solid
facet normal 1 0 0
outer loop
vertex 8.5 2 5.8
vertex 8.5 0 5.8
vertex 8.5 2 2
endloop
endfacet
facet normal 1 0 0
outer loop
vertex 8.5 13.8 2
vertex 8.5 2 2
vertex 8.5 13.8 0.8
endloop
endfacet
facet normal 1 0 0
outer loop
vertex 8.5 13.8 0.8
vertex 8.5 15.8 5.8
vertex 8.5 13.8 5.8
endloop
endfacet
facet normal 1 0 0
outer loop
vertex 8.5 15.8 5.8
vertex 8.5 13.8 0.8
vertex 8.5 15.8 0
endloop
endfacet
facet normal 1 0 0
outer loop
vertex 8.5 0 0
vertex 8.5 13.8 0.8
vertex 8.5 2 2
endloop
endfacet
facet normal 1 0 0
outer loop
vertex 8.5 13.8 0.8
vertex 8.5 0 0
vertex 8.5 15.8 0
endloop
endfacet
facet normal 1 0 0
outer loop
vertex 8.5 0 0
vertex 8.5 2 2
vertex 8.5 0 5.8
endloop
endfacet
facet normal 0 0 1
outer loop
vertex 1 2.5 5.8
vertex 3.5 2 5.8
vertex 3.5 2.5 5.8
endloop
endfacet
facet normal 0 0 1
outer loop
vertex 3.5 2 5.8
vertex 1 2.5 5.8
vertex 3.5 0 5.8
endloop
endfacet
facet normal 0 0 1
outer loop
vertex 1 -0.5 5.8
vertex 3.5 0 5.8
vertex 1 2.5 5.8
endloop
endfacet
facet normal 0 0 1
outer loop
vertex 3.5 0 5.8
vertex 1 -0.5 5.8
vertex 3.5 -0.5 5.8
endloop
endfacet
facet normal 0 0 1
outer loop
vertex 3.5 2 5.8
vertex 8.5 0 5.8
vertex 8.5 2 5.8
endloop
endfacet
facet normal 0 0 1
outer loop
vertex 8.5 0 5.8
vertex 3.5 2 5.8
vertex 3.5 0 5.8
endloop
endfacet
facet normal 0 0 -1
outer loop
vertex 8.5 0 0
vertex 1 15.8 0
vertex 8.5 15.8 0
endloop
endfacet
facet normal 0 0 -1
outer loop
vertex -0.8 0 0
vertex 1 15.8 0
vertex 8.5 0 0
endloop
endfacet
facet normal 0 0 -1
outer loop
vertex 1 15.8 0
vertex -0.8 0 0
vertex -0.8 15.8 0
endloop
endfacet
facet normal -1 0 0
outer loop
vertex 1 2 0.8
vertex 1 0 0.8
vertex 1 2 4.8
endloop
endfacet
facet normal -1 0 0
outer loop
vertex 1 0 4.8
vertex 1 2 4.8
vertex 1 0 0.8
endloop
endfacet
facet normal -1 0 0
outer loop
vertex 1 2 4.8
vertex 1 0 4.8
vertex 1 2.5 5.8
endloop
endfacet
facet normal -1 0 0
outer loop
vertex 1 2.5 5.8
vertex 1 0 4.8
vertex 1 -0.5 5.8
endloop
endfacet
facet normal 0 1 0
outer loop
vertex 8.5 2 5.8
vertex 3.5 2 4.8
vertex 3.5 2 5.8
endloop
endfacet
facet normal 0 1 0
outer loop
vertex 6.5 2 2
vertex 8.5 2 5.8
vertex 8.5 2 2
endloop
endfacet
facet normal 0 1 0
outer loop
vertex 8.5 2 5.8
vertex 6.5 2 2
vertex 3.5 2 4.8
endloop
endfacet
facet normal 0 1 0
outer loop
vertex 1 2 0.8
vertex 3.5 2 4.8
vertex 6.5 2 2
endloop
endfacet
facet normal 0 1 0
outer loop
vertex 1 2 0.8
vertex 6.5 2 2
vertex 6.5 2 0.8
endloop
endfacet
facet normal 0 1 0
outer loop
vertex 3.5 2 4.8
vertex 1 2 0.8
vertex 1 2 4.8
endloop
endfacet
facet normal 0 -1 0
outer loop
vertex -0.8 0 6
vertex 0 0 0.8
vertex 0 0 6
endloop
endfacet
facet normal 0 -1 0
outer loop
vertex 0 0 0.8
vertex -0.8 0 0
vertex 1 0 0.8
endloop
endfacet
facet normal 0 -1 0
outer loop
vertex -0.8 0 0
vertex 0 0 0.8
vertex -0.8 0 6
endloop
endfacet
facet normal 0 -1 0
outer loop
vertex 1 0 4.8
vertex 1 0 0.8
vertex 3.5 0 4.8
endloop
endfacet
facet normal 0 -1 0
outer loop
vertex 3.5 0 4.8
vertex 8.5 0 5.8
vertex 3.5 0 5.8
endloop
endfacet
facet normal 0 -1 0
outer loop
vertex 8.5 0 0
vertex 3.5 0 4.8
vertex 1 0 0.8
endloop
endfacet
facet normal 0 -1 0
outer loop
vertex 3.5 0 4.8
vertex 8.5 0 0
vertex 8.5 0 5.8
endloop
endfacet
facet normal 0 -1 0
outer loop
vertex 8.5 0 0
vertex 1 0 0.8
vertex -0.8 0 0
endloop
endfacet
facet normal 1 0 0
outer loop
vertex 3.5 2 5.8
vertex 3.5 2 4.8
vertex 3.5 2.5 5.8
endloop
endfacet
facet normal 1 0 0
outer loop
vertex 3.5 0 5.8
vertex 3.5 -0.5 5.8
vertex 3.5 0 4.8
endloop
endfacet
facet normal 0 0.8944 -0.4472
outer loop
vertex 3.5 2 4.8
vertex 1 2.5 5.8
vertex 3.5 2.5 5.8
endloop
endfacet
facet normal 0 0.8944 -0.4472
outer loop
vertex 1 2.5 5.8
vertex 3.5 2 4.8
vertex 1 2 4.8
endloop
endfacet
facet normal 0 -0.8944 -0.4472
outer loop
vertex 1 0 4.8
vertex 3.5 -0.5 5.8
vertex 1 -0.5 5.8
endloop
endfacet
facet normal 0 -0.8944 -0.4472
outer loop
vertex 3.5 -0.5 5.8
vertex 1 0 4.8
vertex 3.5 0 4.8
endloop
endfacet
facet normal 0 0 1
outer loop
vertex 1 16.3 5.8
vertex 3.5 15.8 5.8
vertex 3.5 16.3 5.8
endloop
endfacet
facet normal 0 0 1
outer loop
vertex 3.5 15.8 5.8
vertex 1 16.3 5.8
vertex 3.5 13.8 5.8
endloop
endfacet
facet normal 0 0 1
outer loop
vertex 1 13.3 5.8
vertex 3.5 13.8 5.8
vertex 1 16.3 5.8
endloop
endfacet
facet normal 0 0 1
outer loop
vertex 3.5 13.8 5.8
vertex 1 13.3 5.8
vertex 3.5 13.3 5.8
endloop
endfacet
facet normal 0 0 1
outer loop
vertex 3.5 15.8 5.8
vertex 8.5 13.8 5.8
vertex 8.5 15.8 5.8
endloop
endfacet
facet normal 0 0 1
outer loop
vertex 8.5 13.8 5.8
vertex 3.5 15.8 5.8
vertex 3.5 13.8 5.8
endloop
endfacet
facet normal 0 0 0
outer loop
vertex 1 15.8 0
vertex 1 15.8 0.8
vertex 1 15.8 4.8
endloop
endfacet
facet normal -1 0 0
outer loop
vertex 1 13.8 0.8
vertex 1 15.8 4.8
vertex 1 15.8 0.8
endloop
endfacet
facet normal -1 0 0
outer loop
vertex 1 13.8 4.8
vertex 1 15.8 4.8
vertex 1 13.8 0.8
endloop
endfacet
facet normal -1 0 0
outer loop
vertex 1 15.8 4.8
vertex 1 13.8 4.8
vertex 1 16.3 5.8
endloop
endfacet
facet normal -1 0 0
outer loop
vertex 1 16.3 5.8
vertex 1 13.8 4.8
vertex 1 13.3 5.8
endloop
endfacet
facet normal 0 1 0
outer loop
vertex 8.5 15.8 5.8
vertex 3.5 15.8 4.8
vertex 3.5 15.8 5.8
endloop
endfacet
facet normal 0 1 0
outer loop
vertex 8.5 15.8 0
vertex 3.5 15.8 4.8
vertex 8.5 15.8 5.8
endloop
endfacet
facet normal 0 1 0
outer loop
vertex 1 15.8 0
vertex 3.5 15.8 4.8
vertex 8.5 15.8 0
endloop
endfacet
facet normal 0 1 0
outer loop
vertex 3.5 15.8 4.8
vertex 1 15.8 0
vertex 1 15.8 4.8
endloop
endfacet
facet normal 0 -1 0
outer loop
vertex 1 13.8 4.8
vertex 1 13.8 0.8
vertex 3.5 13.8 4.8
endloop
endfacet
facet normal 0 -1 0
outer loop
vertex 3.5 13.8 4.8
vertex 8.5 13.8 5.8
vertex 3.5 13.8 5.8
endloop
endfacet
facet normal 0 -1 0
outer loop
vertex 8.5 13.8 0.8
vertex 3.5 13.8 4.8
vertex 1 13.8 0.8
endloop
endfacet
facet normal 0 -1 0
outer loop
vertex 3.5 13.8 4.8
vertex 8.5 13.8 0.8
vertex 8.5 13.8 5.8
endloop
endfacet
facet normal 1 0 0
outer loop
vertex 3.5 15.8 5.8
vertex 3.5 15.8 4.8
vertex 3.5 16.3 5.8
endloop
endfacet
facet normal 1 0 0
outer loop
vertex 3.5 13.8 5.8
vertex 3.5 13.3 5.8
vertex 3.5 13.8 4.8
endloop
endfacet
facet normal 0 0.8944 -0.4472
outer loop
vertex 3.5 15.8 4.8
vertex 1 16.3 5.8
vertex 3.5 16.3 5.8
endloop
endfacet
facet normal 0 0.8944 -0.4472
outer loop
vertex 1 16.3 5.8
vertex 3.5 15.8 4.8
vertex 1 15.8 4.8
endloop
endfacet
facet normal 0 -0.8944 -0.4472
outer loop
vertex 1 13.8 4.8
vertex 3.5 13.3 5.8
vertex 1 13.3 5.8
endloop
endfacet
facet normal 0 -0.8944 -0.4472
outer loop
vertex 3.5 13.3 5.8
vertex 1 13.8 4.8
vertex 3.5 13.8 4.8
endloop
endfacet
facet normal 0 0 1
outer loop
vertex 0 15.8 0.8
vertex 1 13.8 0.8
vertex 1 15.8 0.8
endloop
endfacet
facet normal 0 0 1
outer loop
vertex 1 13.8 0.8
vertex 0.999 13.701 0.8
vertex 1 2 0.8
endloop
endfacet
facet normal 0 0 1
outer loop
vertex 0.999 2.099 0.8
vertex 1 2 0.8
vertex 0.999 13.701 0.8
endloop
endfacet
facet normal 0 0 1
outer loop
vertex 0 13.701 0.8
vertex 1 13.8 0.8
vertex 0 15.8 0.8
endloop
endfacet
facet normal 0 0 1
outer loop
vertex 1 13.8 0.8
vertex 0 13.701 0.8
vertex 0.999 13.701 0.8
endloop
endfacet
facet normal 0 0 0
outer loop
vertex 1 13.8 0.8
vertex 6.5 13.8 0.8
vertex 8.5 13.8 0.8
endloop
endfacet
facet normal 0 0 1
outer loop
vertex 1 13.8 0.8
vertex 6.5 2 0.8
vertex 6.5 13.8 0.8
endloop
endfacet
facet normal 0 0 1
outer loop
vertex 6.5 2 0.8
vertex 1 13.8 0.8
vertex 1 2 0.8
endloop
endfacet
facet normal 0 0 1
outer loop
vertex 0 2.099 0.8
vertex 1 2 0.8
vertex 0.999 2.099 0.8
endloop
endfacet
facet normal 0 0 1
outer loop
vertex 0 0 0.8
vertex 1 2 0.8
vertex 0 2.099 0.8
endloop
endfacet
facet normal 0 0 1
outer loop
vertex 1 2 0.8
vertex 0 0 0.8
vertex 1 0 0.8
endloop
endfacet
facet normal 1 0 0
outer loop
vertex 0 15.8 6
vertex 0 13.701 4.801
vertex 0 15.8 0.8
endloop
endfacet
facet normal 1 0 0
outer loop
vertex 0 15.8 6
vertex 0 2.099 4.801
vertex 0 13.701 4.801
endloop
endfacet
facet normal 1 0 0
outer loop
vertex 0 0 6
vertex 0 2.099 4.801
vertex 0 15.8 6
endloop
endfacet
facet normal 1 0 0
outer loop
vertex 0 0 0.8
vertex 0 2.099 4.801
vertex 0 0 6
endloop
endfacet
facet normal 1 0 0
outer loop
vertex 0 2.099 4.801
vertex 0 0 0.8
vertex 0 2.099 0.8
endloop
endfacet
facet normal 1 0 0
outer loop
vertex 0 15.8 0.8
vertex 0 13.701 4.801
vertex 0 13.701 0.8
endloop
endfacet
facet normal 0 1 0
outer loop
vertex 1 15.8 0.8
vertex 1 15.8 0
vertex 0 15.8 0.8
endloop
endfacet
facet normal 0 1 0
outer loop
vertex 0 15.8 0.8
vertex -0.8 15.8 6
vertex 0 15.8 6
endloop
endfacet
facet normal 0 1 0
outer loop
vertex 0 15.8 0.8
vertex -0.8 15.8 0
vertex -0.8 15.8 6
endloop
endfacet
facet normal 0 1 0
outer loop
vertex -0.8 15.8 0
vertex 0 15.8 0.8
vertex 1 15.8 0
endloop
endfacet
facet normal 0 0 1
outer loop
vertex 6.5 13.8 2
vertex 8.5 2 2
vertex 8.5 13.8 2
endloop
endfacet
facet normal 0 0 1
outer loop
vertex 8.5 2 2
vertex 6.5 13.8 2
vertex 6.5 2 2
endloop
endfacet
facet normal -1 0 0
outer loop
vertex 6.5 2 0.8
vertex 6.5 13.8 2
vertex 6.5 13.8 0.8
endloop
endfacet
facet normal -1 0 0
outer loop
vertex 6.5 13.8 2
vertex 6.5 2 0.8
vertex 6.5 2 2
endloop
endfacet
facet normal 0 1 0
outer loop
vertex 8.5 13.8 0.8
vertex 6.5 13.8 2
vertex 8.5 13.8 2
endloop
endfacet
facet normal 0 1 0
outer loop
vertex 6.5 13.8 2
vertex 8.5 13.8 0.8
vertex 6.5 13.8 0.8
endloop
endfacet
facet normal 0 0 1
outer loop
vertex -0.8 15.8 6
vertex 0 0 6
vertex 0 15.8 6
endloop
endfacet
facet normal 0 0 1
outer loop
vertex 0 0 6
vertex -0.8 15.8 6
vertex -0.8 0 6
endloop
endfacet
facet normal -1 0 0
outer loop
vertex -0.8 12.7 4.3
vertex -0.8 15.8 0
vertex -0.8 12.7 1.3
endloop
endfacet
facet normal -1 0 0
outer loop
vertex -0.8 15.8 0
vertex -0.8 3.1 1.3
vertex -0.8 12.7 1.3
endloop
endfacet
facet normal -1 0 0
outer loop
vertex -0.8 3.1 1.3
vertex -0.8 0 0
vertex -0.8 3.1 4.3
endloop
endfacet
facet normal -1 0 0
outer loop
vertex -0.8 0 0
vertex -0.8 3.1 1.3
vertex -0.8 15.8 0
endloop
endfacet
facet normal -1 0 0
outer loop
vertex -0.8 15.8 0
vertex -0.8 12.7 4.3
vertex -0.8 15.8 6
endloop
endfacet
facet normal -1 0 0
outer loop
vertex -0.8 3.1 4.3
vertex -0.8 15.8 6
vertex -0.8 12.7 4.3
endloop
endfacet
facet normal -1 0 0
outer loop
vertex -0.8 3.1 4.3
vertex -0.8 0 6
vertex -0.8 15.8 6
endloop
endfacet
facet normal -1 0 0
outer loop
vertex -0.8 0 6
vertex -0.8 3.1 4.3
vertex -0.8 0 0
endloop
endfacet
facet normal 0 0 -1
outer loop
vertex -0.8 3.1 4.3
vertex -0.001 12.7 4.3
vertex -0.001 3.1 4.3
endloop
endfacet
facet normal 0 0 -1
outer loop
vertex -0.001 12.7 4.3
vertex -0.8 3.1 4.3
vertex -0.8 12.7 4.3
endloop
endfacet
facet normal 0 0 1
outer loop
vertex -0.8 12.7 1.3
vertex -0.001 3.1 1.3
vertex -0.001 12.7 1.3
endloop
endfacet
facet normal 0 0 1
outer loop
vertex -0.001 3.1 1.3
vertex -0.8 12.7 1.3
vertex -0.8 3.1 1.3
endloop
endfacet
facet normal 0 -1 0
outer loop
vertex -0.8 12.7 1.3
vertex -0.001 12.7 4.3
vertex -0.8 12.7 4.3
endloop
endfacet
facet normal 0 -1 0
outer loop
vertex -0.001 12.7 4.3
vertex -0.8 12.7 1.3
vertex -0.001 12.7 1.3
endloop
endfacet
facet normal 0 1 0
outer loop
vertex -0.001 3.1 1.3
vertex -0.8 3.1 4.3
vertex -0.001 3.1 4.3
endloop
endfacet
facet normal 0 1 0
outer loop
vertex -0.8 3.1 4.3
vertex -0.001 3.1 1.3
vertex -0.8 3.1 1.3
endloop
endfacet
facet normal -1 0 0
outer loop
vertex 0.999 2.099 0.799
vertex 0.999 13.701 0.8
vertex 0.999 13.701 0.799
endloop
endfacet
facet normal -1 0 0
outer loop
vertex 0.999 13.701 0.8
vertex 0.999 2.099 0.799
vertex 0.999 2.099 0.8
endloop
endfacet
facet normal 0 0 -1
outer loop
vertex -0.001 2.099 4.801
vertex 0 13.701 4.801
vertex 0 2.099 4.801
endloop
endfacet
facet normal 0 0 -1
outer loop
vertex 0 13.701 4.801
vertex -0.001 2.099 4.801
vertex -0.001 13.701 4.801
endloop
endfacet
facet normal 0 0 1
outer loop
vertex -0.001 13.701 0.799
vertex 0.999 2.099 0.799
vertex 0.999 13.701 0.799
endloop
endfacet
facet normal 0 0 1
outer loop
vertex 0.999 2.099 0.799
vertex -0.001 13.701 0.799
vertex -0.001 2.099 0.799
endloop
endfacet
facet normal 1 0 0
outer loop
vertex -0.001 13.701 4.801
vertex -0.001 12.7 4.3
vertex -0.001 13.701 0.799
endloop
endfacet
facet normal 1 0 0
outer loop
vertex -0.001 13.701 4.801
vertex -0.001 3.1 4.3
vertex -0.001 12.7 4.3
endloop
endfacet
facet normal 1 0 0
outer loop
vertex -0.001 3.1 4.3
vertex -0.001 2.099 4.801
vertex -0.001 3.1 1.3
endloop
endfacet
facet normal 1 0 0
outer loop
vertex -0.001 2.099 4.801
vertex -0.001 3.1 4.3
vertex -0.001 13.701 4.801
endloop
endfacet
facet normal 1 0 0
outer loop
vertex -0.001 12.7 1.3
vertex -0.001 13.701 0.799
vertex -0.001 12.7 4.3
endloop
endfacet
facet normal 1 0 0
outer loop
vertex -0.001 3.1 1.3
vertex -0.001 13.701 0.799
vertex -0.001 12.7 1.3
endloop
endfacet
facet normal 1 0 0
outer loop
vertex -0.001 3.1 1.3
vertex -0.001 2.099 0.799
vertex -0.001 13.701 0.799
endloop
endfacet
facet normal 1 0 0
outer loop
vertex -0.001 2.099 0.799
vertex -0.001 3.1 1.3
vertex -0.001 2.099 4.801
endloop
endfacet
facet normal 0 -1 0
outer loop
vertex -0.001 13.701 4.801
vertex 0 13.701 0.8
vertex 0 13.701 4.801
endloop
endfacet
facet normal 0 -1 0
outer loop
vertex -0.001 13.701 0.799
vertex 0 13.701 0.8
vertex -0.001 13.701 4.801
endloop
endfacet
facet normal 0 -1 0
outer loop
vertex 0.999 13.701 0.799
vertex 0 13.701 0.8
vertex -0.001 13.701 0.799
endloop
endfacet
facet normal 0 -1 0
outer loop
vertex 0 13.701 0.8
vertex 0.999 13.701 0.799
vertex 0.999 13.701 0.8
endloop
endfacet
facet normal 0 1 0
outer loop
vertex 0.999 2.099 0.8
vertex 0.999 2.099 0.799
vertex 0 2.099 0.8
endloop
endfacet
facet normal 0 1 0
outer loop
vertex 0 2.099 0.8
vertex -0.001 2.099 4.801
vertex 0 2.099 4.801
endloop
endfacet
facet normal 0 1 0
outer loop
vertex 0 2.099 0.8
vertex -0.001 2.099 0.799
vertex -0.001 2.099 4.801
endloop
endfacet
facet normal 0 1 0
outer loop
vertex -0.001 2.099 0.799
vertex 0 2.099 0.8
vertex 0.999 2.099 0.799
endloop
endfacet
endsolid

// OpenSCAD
EPSILON = 0.001;

BODY_WIDTH = 6.4;
BODY_DEPTH = 11.6;
BODY_HEIGHT = 4;

MOVING_PART_SIZE = 2;
PINS_WIDTH = 4.6;
PINS_DEPTH = 5;
PINS_HEIGHT = 0.5;

HOLDER_WALL_THICKNESS = 2;
BODY_MARGIN = 0.1;

function OnOffSwitch_width() = BODY_WIDTH;
function OnOffSwitch_depth() = BODY_DEPTH;

function OnOffSwitch_holderWidth() = BODY_WIDTH + HOLDER_WALL_THICKNESS + BODY_MARGIN;
function OnOffSwitch_holderDepth() = BODY_DEPTH + 2 * (HOLDER_WALL_THICKNESS + BODY_MARGIN);

/**
 * ON-OFF switch.
 *
 * @param positiveShape
 *     if true, draw only the positive part.
 *     if false, draw only the negative part.
 */
module OnOffSwitch(baseThickness = 0.8, positiveShape = true) {
    translate([0, HOLDER_WALL_THICKNESS + BODY_MARGIN, baseThickness]) {
        // Base
        if (positiveShape) {
            translate([0, 0, 0])
                cube([BODY_WIDTH, BODY_DEPTH, BODY_HEIGHT]);
        }
        
        // Moving part
        if (positiveShape) {
            translate([-MOVING_PART_SIZE, (BODY_DEPTH - MOVING_PART_SIZE) / 2,
                       (BODY_HEIGHT - MOVING_PART_SIZE) / 2])
                cube([MOVING_PART_SIZE, MOVING_PART_SIZE, MOVING_PART_SIZE]);
        }
        
        // Pins
        if (positiveShape) {
            translate([BODY_WIDTH, (BODY_DEPTH - PINS_DEPTH) / 2, (BODY_HEIGHT - PINS_HEIGHT) / 2])
                cube([PINS_WIDTH, PINS_DEPTH, PINS_HEIGHT]);
        }
    }
}

/**
 * ON-OFF switch holder.
 *
 * @param positiveShape
 *     if true, draw only the positive part.
 *     if false, draw only the negative part.
 */
module OnOffSwitch_holder(baseThickness = 0.8, positiveShape = true) {
    // Base
    baseWidth = OnOffSwitch_holderWidth();
    baseDepth = OnOffSwitch_holderDepth();
    if (positiveShape) {
        cube([baseWidth, baseDepth, baseThickness]);
    }
    
    // Clearance for the moving part
    if (!positiveShape) {
        width = 4;
        depth = BODY_DEPTH - 2;
        height = MOVING_PART_SIZE + 1;
        translate([-width, (baseDepth - depth) / 2, (BODY_HEIGHT - height) / 2 + baseThickness])
            cube([width + EPSILON, depth, height]);
    }
    
    // Clearance for the fixed part (front)
    if (!positiveShape) {
        depth = BODY_DEPTH + 2 * EPSILON;
        height = BODY_HEIGHT + 2 * EPSILON;
        translate([-EPSILON, (baseDepth - depth) / 2, (BODY_HEIGHT - height) / 2 + baseThickness])
            cube([1, depth, height]);
    }
    
    // Top and bottom walls
    wallHeight = BODY_HEIGHT + baseThickness;
    if (positiveShape) {
        horizontalSupportWidth = 1;
        frontClearance = 1;
        wallWidth = baseWidth - frontClearance;
        
        for (y = [0, baseDepth - HOLDER_WALL_THICKNESS])
            translate([frontClearance, y, 0]) {
                cube([wallWidth, HOLDER_WALL_THICKNESS, wallHeight + horizontalSupportWidth]);
                
                translate([0, HOLDER_WALL_THICKNESS / 2, wallHeight])
                    linear_extrude(height = 1, scale = [1, 1.5])
                        translate([0, -HOLDER_WALL_THICKNESS / 2])
                            square([wallWidth - 5, HOLDER_WALL_THICKNESS]);
            }
    }
    
    // Back wall
    if (positiveShape) {
        translate([baseWidth - HOLDER_WALL_THICKNESS, 2, 0]) {
            cube([HOLDER_WALL_THICKNESS, baseDepth - 4, 1.2 + baseThickness]);
        }
    }
}

/**
 * ON-OFF switch clearance.
 *
 * @param positiveShape
 *     if true, draw only the positive part of the switch,
 *     if false, draw only the negative part.
 * @Deprecated To be deleted with FrontCover.scad
 */
module OnOffSwitch_clearance(positiveShape = true) {
    // Moving part clearance
    if (!positiveShape) {
        depth = BODY_DEPTH - 2;
        translate([BODY_WIDTH, -depth - 1, 0.5])
            cube([4, depth, 3]);
    }
}
/*
color("gray")
    difference() {
        OnOffSwitch(0.8, true);
        OnOffSwitch(0.8, false);
    }
    */
difference() {
    union() {
        // Simulate the cover border
        translate([-0.8, 0, 0])
            cube([0.8, OnOffSwitch_holderDepth(), 6]);
        
        OnOffSwitch_holder(0.8, true);
    }
    OnOffSwitch_holder(0.8, false);
}
